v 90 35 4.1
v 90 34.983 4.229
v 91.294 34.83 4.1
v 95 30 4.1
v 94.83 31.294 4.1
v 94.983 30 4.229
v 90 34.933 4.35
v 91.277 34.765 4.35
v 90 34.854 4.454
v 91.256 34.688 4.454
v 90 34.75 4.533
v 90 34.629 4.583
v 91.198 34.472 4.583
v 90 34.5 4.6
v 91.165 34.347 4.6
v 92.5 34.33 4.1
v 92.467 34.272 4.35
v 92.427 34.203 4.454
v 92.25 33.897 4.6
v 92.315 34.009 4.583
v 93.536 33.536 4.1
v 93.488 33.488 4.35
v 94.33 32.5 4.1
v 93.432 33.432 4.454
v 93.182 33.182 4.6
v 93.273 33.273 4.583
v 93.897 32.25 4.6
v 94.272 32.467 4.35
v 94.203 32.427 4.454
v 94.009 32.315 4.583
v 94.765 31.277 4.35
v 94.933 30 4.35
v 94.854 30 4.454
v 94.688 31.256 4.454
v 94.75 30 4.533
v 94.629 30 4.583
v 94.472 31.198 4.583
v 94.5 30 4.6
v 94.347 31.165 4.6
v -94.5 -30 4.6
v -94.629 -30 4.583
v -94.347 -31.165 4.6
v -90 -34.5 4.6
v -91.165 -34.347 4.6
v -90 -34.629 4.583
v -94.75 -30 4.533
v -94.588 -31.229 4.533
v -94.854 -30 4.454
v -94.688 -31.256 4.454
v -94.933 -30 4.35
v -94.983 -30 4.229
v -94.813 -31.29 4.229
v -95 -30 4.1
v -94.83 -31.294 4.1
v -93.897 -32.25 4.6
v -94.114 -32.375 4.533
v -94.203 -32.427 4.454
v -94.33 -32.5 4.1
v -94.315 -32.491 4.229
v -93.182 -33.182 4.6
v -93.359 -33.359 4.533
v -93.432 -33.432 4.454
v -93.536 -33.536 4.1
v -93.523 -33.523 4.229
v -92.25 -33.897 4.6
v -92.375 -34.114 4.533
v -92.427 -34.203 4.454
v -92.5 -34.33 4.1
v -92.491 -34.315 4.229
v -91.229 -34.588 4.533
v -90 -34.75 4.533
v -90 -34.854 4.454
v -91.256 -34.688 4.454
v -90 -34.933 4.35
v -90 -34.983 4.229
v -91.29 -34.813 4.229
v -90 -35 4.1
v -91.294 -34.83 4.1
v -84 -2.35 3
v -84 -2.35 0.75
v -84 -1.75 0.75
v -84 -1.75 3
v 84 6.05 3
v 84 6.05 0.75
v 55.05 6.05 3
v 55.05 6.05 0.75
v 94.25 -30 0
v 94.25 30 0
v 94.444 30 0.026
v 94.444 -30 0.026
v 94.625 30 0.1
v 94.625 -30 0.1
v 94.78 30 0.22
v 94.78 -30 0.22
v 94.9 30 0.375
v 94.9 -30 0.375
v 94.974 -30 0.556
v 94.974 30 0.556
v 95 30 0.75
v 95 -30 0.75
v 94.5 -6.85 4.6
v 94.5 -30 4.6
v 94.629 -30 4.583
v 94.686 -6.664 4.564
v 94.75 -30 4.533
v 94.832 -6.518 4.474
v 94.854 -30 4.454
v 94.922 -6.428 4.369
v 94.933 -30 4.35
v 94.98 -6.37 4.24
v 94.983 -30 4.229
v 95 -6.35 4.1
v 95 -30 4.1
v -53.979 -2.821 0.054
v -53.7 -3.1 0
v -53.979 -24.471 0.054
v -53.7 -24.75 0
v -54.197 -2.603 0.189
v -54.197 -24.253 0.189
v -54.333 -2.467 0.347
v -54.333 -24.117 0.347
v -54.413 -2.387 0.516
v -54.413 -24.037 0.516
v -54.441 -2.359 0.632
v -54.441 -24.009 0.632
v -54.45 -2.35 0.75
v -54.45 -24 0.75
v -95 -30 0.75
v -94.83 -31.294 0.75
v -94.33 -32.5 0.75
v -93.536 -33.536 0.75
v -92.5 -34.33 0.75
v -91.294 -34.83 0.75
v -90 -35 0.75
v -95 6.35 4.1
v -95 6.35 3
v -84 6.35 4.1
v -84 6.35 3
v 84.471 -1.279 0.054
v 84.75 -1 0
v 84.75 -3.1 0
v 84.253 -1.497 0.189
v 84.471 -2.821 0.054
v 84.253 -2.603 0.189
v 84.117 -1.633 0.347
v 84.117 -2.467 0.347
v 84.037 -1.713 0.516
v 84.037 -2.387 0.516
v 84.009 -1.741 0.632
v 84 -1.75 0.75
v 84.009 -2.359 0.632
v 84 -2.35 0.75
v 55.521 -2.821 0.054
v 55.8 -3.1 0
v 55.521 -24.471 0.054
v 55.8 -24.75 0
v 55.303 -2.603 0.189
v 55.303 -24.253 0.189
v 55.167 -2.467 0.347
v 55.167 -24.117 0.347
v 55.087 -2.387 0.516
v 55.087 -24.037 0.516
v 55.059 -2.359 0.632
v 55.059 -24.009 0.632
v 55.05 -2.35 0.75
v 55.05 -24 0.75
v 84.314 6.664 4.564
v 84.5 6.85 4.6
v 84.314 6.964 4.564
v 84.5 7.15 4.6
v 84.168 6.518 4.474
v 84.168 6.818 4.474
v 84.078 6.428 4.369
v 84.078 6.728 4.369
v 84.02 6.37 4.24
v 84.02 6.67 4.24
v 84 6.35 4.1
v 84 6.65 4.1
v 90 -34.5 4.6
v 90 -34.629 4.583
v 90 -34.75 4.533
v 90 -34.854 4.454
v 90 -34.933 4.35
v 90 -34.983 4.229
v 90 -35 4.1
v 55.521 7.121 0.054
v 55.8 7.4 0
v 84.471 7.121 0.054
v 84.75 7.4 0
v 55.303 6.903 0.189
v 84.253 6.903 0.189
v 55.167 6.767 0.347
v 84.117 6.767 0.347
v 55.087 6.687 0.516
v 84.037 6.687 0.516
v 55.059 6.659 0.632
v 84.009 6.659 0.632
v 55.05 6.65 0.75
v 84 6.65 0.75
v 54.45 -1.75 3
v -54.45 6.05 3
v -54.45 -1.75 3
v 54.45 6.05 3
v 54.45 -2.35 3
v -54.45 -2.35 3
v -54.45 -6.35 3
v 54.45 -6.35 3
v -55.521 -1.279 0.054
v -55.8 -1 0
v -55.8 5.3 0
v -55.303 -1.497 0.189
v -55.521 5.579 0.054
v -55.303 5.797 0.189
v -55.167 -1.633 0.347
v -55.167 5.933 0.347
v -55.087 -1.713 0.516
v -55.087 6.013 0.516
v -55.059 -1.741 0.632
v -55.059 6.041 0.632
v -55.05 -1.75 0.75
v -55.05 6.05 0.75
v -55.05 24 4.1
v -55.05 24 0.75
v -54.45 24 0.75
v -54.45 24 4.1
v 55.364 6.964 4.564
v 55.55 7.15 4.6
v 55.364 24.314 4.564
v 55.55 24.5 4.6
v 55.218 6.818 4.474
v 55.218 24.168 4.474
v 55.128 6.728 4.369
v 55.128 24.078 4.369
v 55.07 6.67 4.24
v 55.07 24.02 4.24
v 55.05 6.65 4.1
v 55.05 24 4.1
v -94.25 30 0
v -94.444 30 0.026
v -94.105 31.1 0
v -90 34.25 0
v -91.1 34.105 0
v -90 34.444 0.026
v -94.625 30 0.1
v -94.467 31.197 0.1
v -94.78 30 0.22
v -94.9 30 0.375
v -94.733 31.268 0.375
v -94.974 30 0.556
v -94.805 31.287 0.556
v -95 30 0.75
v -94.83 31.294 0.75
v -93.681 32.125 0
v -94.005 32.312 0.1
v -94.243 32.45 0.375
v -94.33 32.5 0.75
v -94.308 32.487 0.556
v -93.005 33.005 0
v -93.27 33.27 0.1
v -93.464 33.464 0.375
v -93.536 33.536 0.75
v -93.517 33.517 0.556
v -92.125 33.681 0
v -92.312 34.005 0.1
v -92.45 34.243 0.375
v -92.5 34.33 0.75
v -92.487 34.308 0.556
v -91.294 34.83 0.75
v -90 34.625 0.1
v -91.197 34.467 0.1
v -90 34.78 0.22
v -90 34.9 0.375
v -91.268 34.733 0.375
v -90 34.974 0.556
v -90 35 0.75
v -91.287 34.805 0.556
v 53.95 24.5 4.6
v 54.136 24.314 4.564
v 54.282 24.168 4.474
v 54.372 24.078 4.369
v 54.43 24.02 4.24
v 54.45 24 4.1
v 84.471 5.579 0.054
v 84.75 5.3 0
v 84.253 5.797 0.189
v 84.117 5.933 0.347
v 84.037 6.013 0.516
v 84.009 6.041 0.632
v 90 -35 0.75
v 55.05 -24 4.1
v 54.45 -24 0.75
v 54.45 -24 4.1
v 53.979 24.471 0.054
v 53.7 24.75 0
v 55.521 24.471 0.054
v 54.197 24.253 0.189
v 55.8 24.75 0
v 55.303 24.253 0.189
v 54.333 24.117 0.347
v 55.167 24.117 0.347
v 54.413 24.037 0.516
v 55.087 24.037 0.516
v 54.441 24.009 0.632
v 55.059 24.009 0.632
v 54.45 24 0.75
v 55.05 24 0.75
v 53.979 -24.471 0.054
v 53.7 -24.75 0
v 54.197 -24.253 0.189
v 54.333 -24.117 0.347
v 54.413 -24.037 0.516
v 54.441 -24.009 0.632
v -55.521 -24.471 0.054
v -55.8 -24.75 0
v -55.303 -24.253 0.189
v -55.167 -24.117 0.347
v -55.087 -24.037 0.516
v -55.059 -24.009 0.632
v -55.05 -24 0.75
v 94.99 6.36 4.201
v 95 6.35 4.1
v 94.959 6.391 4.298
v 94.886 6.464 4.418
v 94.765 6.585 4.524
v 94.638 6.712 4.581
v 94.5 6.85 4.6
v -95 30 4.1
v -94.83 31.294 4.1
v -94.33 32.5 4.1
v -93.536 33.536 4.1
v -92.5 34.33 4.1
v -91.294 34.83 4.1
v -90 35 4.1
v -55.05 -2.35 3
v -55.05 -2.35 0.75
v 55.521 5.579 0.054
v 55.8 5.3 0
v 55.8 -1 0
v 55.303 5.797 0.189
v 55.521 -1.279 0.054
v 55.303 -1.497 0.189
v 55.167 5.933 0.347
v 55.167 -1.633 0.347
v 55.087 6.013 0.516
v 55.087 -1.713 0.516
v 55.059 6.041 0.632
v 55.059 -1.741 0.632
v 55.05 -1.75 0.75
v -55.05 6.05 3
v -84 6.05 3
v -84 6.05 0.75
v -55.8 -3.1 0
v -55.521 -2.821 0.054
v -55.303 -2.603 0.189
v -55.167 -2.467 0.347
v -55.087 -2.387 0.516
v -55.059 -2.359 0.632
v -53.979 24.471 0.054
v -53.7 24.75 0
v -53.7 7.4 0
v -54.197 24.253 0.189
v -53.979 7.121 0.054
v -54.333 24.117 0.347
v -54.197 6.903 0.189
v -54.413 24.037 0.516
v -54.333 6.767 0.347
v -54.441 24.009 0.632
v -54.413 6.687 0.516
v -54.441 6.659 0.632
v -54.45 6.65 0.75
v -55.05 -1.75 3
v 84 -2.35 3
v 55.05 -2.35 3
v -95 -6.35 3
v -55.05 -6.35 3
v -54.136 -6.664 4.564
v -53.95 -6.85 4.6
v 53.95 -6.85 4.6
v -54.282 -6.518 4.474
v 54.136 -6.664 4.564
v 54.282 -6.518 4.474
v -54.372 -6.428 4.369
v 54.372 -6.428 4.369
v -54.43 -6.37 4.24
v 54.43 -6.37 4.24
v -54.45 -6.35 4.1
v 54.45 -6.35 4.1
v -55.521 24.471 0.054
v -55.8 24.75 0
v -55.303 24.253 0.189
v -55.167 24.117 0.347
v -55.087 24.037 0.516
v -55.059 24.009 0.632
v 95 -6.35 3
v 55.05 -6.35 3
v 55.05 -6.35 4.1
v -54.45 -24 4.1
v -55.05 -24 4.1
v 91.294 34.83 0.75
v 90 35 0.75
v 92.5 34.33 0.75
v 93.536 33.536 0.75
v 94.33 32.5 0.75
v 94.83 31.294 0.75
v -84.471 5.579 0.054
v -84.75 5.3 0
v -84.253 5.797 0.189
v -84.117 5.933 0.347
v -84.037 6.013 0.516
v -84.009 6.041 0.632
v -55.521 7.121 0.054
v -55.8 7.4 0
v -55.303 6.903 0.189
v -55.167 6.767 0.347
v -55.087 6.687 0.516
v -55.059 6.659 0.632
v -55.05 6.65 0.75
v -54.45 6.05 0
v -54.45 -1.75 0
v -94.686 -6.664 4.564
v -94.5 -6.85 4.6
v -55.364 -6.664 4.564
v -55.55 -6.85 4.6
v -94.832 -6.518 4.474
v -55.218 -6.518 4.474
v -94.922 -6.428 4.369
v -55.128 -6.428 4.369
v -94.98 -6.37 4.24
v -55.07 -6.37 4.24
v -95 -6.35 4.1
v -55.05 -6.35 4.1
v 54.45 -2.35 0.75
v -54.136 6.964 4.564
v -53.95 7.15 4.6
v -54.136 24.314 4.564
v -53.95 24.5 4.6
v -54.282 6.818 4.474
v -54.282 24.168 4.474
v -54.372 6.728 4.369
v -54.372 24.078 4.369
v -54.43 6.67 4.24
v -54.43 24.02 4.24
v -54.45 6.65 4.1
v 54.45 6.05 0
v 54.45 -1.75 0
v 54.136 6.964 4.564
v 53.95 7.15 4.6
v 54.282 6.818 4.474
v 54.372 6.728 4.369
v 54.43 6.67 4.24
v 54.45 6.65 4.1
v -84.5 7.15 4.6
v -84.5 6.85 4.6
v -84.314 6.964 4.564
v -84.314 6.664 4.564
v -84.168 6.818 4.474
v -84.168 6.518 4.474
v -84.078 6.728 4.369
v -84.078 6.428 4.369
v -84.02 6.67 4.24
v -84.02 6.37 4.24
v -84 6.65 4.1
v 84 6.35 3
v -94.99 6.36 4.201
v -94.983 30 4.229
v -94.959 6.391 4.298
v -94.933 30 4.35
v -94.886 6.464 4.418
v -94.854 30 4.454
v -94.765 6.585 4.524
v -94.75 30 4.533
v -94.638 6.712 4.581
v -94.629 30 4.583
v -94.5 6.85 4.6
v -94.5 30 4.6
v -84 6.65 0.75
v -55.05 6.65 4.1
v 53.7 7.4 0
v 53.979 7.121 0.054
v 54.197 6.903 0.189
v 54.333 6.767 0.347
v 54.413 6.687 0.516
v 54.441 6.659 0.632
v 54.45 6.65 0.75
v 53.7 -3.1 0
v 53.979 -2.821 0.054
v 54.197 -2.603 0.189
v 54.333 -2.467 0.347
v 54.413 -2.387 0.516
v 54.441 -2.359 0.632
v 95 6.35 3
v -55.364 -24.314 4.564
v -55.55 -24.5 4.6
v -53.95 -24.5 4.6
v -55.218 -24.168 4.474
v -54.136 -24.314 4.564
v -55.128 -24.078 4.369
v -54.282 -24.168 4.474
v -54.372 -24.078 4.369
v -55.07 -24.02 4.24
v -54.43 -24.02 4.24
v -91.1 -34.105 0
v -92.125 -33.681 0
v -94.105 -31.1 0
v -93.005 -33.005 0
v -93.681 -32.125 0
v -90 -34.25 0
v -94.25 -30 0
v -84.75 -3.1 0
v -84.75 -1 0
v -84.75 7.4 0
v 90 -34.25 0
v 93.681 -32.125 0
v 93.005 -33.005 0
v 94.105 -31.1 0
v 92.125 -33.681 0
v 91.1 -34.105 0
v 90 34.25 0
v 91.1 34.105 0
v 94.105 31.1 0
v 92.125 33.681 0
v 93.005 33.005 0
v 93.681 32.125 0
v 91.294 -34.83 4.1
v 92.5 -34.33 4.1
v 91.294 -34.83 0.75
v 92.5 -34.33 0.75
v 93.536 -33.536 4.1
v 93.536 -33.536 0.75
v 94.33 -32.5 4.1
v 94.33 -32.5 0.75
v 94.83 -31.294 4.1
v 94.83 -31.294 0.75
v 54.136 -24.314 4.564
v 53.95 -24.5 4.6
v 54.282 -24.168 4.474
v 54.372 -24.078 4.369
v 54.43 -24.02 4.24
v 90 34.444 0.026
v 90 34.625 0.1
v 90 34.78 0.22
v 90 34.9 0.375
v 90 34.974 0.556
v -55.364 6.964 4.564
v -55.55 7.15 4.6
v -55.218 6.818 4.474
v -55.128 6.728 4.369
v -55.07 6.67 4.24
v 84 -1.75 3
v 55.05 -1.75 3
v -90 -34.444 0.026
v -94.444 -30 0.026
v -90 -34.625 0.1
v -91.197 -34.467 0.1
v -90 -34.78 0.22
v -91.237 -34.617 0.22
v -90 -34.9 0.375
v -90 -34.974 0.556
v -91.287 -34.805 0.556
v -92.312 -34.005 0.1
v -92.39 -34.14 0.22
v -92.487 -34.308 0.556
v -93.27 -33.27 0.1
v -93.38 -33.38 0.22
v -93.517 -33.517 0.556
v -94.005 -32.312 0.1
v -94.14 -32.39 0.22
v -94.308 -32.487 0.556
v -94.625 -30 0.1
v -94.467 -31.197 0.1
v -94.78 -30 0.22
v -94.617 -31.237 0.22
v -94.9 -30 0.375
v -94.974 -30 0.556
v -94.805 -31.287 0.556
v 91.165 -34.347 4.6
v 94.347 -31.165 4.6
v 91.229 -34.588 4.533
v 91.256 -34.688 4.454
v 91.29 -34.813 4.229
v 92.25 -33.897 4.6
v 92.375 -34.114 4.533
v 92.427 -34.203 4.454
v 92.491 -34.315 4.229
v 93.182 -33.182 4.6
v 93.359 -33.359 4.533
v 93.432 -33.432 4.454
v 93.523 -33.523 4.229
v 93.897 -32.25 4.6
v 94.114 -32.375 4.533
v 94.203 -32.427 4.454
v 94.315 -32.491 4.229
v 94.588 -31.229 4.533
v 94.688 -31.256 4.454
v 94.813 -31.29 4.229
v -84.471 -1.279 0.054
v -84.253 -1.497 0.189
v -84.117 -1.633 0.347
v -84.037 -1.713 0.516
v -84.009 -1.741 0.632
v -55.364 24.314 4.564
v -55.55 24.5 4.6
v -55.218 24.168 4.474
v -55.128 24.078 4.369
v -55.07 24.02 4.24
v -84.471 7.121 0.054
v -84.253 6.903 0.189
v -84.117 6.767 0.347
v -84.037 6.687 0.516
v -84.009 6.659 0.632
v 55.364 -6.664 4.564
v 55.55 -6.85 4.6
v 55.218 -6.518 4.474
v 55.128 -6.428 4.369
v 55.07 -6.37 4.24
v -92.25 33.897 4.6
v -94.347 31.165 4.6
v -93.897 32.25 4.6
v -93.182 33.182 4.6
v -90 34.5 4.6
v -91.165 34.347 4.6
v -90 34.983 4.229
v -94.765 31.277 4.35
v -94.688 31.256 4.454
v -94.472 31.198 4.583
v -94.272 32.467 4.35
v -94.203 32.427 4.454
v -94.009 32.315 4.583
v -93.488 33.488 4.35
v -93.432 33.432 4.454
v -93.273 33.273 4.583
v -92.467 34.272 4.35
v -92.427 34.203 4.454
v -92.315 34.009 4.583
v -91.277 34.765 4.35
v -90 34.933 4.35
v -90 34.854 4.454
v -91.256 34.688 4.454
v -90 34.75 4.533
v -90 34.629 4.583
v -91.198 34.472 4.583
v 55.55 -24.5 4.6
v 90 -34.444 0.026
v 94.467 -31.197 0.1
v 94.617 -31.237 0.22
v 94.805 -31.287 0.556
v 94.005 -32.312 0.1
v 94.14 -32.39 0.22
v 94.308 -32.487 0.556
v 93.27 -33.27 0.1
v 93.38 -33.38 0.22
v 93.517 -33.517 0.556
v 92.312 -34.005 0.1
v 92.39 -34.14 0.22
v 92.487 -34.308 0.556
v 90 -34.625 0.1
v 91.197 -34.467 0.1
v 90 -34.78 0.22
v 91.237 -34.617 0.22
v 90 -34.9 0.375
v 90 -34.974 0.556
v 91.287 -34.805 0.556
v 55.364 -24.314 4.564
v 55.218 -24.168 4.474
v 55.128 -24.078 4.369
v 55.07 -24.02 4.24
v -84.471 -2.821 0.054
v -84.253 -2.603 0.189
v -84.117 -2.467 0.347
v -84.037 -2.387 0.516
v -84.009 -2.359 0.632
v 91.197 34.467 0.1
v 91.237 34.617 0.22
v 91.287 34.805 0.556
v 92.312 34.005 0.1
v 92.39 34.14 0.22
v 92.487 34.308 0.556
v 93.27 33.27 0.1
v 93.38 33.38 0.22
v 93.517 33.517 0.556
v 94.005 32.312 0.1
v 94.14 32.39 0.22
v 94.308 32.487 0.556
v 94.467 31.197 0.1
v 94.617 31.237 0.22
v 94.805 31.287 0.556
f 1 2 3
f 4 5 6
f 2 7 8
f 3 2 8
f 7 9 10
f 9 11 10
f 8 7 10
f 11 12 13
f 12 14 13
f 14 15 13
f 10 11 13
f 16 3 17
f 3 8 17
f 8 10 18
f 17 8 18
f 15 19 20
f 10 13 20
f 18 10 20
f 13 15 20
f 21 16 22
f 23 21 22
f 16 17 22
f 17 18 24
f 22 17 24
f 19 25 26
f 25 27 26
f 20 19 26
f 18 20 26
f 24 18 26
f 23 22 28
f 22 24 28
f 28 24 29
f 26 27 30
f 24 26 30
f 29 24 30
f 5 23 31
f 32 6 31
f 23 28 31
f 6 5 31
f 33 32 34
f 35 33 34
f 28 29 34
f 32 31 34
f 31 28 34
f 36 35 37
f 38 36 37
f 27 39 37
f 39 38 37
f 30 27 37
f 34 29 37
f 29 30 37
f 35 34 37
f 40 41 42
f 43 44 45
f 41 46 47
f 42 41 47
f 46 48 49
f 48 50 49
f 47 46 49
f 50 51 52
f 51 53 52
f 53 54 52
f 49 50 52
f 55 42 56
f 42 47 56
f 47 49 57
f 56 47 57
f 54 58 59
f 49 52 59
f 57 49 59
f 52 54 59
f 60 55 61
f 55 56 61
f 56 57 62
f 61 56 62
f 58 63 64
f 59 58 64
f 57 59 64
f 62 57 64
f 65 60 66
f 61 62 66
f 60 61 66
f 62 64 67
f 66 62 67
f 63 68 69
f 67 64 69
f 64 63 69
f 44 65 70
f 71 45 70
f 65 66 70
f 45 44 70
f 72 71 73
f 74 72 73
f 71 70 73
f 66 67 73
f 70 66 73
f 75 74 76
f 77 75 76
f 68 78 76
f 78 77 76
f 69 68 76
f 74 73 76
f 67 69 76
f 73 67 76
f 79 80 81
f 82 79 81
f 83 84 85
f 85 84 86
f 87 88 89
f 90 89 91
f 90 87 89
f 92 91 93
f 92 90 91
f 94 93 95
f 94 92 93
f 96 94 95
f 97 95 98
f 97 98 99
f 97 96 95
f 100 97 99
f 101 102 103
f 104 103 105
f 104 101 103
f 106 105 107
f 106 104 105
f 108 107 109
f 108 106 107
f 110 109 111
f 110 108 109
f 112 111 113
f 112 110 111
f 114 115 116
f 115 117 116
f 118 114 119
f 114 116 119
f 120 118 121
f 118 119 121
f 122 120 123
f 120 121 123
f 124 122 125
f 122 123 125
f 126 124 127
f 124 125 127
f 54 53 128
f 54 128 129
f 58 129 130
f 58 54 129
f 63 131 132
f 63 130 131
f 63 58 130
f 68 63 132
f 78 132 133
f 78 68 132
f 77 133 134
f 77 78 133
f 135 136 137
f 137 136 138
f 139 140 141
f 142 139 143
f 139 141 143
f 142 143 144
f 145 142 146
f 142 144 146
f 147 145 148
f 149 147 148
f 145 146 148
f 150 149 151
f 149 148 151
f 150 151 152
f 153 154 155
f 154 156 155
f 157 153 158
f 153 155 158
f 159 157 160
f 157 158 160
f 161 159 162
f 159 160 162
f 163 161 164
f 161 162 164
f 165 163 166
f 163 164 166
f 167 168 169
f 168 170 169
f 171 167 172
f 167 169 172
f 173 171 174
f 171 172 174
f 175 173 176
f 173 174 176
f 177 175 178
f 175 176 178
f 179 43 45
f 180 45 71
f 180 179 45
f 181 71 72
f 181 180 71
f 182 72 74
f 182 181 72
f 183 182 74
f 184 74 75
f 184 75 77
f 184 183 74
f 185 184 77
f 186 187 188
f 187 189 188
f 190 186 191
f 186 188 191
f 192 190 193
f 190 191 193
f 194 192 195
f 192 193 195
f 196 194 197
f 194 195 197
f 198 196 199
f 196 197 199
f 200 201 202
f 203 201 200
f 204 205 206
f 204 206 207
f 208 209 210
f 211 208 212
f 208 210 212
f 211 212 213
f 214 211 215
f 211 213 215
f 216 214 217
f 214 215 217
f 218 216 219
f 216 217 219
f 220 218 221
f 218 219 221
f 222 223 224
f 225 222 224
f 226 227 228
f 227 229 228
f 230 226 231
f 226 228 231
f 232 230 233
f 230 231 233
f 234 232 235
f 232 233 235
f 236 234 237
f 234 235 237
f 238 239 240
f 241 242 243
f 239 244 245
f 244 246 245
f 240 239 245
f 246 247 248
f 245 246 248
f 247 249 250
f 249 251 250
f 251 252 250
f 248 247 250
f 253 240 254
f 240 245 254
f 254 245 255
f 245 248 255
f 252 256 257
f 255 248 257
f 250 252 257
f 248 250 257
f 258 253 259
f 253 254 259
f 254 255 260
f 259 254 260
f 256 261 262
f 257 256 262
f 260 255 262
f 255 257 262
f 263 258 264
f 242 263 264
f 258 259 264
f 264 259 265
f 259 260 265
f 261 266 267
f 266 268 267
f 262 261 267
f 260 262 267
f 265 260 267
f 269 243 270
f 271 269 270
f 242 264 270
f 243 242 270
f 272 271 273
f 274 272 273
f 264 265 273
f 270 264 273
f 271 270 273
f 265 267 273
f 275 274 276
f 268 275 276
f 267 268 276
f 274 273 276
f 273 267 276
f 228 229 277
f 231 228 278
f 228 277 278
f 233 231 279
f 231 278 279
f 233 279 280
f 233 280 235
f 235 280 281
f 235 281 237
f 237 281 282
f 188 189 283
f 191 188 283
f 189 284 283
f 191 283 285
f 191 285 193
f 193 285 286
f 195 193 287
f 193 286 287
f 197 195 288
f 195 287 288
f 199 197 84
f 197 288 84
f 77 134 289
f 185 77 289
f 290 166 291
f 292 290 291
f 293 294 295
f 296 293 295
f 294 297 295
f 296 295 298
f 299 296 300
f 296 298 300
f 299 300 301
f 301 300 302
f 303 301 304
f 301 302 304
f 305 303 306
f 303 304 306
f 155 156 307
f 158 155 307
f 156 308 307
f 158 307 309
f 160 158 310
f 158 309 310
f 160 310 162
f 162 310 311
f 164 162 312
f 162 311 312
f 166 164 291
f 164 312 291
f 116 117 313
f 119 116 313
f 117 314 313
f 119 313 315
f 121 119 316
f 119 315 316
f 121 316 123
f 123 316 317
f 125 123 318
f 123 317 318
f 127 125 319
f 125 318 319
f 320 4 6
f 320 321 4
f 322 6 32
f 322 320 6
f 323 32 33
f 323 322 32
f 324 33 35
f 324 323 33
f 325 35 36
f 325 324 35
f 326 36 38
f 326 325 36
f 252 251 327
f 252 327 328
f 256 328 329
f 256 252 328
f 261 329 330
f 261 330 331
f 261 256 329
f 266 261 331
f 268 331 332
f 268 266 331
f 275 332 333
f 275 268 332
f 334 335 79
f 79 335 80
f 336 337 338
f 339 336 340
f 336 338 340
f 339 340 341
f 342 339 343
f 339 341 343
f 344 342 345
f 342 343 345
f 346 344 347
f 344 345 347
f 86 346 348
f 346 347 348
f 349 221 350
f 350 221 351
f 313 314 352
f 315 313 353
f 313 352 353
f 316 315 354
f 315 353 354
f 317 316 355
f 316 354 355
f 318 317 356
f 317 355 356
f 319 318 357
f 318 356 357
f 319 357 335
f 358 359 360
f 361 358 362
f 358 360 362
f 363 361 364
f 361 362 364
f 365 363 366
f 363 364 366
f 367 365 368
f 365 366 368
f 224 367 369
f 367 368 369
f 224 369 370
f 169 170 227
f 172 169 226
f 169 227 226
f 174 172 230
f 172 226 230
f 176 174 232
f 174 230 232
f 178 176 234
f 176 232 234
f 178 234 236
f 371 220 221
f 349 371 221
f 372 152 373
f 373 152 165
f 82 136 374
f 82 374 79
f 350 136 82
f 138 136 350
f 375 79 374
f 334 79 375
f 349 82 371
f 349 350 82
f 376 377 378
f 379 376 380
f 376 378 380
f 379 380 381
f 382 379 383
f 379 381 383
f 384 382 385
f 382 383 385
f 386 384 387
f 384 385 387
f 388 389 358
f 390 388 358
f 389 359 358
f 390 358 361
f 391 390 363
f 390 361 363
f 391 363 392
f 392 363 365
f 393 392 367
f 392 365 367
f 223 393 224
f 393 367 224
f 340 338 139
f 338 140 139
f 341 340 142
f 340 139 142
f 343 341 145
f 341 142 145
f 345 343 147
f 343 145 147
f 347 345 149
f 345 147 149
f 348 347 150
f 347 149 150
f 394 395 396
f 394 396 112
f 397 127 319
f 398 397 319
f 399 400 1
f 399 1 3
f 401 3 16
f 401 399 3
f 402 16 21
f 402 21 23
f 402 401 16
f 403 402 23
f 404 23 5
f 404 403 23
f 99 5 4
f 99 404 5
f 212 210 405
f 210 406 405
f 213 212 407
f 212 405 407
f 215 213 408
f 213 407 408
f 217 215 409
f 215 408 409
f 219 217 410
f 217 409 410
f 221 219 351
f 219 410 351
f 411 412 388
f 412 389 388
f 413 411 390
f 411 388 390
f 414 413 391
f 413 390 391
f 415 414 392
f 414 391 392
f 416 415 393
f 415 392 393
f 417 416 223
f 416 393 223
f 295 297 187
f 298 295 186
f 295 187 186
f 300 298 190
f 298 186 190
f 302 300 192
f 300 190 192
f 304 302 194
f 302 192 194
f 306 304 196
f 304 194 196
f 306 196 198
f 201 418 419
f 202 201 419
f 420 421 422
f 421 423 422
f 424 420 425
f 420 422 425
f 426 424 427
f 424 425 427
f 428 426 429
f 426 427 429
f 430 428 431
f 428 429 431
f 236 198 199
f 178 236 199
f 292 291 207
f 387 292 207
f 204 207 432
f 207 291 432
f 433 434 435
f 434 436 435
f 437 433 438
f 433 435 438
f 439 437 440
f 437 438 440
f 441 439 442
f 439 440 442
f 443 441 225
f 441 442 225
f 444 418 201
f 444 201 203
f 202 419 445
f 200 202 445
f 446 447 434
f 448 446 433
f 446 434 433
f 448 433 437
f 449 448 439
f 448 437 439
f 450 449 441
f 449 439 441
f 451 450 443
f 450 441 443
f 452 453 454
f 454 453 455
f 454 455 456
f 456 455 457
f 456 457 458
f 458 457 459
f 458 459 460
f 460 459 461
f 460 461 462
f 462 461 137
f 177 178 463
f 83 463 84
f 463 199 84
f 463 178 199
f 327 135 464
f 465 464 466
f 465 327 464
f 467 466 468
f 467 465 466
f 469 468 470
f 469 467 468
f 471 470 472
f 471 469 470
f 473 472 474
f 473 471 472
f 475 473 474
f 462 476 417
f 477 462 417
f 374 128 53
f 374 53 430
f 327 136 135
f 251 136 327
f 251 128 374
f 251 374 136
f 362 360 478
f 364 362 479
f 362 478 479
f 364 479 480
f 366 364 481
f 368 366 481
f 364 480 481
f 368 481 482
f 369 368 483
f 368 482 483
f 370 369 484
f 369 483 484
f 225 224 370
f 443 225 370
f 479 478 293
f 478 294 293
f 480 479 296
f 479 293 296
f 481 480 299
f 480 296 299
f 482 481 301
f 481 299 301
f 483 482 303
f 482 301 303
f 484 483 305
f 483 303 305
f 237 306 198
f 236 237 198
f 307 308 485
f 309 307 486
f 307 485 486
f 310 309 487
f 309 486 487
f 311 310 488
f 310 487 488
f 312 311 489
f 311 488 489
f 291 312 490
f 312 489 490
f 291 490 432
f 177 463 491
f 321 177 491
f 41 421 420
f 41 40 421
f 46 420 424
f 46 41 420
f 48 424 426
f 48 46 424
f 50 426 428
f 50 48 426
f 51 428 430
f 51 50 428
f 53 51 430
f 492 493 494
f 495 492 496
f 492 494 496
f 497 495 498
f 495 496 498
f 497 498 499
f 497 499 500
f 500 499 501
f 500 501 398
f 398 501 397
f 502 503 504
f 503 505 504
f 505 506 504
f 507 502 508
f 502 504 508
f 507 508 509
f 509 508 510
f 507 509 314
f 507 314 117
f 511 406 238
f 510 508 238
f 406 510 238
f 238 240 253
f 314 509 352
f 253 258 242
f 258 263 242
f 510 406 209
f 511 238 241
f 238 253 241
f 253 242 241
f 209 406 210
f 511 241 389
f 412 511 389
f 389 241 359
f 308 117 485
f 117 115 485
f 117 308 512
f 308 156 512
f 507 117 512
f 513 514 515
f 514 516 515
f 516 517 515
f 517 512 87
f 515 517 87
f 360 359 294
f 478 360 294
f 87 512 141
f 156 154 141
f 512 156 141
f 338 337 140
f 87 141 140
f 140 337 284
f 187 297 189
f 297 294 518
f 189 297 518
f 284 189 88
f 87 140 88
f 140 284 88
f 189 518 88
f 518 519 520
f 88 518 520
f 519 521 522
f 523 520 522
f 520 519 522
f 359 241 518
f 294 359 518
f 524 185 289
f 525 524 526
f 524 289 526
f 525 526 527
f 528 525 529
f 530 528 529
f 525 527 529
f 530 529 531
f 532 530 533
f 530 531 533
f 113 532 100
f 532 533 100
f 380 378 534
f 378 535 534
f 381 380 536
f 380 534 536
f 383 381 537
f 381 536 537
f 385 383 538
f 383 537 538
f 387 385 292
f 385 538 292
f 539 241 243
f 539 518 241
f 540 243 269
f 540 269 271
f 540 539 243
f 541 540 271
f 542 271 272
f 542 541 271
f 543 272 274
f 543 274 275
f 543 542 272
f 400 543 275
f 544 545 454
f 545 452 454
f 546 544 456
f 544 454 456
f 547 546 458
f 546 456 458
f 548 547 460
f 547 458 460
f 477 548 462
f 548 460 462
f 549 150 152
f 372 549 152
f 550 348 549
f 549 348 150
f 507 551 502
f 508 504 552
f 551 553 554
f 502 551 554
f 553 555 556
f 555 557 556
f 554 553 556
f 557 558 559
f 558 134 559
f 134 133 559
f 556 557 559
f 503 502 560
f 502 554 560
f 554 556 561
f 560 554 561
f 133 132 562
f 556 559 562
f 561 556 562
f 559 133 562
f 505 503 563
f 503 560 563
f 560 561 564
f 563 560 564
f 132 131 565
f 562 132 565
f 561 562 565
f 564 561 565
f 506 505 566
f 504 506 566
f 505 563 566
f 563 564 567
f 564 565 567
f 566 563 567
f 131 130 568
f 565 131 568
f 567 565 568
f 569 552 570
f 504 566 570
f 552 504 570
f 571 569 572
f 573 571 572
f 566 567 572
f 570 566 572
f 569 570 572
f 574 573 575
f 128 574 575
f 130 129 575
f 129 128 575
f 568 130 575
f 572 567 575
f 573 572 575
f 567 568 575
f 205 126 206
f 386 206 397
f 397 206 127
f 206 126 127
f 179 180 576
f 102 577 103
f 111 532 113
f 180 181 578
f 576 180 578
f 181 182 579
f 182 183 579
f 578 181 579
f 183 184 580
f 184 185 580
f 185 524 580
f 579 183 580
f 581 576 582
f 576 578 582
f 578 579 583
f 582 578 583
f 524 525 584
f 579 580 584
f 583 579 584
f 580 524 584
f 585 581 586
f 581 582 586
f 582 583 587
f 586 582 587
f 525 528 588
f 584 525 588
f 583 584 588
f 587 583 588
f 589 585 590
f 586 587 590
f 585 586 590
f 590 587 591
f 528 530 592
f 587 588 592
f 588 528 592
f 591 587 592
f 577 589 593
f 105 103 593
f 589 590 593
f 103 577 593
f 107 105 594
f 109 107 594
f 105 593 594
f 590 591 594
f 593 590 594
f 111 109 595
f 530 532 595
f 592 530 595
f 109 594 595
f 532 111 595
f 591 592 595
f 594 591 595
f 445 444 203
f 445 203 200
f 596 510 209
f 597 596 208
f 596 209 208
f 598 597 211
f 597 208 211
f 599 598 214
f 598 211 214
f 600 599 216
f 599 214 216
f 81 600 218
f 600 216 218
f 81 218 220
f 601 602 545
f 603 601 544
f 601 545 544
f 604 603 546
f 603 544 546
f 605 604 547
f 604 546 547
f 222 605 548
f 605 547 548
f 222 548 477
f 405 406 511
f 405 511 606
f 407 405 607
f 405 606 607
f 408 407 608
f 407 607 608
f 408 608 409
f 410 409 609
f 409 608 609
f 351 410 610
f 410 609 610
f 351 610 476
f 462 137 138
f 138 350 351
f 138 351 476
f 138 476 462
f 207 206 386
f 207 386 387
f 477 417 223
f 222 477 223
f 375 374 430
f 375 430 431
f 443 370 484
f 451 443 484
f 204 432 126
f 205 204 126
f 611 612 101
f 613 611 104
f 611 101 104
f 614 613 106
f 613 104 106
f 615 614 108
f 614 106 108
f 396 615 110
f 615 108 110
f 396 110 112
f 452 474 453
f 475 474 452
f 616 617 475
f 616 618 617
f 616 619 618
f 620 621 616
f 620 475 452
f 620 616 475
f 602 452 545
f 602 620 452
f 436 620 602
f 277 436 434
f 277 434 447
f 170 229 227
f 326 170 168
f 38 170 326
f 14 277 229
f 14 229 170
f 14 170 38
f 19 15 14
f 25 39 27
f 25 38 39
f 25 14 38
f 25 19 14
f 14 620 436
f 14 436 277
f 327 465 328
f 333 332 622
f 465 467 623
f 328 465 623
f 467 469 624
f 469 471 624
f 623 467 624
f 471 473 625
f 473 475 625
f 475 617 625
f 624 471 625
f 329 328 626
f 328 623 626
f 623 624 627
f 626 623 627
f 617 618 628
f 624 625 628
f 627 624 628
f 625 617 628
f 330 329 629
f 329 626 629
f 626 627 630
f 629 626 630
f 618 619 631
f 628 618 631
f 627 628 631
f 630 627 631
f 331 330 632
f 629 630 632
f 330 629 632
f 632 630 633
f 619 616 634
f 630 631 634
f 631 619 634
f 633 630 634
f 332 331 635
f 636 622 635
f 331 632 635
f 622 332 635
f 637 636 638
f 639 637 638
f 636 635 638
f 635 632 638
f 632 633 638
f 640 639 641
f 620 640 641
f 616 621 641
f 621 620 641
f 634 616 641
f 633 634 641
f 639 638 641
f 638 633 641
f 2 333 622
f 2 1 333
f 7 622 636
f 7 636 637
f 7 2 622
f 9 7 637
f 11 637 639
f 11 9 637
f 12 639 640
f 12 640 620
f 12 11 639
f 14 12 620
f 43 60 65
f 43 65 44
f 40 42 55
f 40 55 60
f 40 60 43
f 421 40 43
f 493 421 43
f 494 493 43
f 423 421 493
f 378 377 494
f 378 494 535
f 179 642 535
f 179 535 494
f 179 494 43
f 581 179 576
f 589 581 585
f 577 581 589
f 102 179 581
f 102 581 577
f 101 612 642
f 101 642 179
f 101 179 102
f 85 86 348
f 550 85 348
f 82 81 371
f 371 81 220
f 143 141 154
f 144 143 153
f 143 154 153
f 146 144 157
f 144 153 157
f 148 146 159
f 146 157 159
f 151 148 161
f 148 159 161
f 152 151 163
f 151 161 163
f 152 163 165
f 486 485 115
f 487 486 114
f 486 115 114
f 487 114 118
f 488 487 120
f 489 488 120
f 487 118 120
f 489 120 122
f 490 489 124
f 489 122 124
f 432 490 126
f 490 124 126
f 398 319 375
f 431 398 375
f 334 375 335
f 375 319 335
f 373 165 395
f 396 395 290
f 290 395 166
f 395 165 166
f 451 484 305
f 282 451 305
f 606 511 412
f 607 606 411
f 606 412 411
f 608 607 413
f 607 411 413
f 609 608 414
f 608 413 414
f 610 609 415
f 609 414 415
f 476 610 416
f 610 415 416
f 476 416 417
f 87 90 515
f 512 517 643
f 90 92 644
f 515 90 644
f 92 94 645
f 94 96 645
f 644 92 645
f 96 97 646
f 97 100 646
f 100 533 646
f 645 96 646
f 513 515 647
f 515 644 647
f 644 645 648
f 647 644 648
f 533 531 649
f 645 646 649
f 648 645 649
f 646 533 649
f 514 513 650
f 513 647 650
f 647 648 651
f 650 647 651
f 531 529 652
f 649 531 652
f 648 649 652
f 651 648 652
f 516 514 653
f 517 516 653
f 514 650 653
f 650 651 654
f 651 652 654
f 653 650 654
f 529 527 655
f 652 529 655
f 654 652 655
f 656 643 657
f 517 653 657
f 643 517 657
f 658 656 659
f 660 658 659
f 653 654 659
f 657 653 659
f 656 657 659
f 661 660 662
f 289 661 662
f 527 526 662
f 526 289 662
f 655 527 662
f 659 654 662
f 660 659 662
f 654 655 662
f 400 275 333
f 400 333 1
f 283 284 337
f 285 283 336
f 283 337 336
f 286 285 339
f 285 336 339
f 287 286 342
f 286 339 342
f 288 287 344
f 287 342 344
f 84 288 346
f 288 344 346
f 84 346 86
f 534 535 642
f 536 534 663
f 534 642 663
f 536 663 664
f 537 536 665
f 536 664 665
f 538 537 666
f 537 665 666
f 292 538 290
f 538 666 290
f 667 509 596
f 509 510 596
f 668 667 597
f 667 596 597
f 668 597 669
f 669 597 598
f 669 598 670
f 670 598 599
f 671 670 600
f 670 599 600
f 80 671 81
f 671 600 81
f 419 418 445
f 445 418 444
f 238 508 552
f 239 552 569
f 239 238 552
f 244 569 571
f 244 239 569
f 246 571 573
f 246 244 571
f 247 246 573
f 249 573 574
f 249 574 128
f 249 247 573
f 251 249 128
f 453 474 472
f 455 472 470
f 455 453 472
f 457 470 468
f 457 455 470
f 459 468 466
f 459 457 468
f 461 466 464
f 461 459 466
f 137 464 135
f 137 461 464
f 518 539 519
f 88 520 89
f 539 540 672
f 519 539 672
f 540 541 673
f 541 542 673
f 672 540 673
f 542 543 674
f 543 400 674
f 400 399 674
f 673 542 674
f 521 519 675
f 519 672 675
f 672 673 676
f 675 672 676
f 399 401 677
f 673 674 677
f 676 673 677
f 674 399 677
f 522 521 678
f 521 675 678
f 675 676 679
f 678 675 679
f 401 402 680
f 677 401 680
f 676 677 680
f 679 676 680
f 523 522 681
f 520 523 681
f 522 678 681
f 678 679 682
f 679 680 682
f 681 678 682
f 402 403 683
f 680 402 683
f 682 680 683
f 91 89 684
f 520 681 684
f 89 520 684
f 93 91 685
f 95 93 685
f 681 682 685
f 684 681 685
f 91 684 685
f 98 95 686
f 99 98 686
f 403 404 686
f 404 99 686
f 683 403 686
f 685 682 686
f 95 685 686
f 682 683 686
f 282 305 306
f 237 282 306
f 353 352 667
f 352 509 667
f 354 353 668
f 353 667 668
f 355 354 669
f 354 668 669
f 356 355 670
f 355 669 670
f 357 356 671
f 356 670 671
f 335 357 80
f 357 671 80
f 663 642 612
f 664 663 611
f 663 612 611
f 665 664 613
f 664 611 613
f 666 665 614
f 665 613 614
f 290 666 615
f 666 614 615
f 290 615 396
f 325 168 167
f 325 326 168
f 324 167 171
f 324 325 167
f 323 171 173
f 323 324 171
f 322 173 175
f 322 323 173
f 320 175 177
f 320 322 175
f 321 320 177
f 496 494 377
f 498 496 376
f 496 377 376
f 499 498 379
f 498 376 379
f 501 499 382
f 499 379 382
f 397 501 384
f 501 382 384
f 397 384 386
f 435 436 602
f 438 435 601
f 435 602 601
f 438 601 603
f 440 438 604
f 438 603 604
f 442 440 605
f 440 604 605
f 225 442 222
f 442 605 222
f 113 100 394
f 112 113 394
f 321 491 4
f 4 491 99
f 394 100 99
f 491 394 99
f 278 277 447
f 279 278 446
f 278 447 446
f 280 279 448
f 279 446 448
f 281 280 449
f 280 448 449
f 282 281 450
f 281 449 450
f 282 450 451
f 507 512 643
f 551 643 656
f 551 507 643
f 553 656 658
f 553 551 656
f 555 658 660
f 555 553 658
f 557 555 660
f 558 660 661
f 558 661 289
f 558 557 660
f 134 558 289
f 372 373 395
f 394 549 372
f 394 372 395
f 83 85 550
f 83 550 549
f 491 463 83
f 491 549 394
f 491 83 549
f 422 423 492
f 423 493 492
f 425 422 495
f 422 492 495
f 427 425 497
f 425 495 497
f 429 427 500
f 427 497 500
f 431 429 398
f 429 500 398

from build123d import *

# Parameters (mm, degrees)
F0_W     = 190
F0_H     = 70
F1_DEPTH = 3
F2_W     = 190
F2_H     = 28.65
F3_DEPTH = 1.6
F4_W     = 108.9
F4_H     = 7.8
F5_DEPTH = 25
F6_R     = 5
F7_R     = 0.75
F8_R     = 0.5


with BuildPart() as f1:
    # F0 (on Top) → F1 (new body)
    with BuildSketch(Plane.XY):
        Rectangle(F0_W, F0_H)
    extrude(amount=F1_DEPTH)

    # F2 (on face) → F3 (join)
    with BuildSketch(Plane.XY.offset(3)):
        with Locations((0, 20.675)):
            Rectangle(F2_W, F2_H)
        with Locations((0, -20.675)):
            Rectangle(F2_W, F2_H)
    extrude(amount=F3_DEPTH)

    # F4 (on face) → F5 (cut)
    with BuildSketch(Plane(origin=(0, 0, 0), x_dir=(1, 0, 0), z_dir=(0, 0, -1))):
        Polygon((-55.05, 2.35), (-84, 2.35), (-84, 1.75), (-55.05, 1.75), (-55.05, -6.05), (-84, -6.05), (-84, -6.65), (-55.05, -6.65), (-55.05, -24), (-54.45, -24), (-54.45, -6.65), (54.45, -6.65), (54.45, -24), (55.05, -24), (55.05, -6.65), (84, -6.65), (84, -6.05), (55.05, -6.05), (55.05, 1.75), (84, 1.75), (84, 2.35), (55.05, 2.35), (55.05, 24), (54.45, 24), (54.45, 2.35), (-54.45, 2.35), (-54.45, 24), (-55.05, 24), align=None)
        with Locations((0, -2.15)):
            Rectangle(F4_W, F4_H, mode=Mode.SUBTRACT)
    extrude(amount=-F5_DEPTH, mode=Mode.SUBTRACT)

    # F6
    f6_edges = [f1.edges().sort_by_distance(p)[0] for p in [
        (95, 35, 2.3),
        (95, -35, 2.3),
        (-95, -35, 2.3),
        (-95, 35, 2.3),
    ]]
    fillet(f6_edges, radius=F6_R)

    # F7
    f7_edges = [f1.edges().sort_by_distance(p)[0] for p in [
        (0, 35, 0),
        (93.535534, 33.535534, 0),
        (-93.535534, 33.535534, 0),
        (95, 0, 0),
        (-95, 0, 0),
        (93.535534, -33.535534, 0),
        (-93.535534, -33.535534, 0),
        (0, -35, 0),
        (-55.05, -13.175, 0),
        (-54.75, -24, 0),
        (-54.45, -13.175, 0),
        (0, -2.35, 0),
        (54.45, -13.175, 0),
        (54.75, -24, 0),
        (55.05, -13.175, 0),
        (69.525, -2.35, 0),
        (84, -2.05, 0),
        (69.525, -1.75, 0),
        (55.05, 2.15, 0),
        (69.525, 6.05, 0),
        (84, 6.35, 0),
        (69.525, 6.65, 0),
        (55.05, 15.325, 0),
        (54.75, 24, 0),
        (54.45, 15.325, 0),
        (0, 6.65, 0),
        (-54.45, 15.325, 0),
        (-54.75, 24, 0),
        (-55.05, 15.325, 0),
        (-69.525, 6.65, 0),
        (-84, 6.35, 0),
        (-69.525, 6.05, 0),
        (-55.05, 2.15, 0),
        (-69.525, -1.75, 0),
        (-84, -2.05, 0),
        (-69.525, -2.35, 0),
    ]]
    fillet(f7_edges, radius=F7_R)

    # F8
    f8_edges = [f1.edges().sort_by_distance(p)[0] for p in [
        (95, -18.175, 4.6),
        (93.535534, -33.535534, 4.6),
        (75.025, -6.35, 4.6),
        (0, -35, 4.6),
        (55.05, -15.175, 4.6),
        (-93.535534, -33.535534, 4.6),
        (54.75, -24, 4.6),
        (-95, -18.175, 4.6),
        (54.45, -15.175, 4.6),
        (-75.025, -6.35, 4.6),
        (0, -6.35, 4.6),
        (-55.05, -15.175, 4.6),
        (-54.45, -15.175, 4.6),
        (-54.75, -24, 4.6),
        (-95, 18.175, 4.6),
        (-93.535534, 33.535534, 4.6),
        (-89.5, 6.35, 4.6),
        (0, 35, 4.6),
        (-84, 6.5, 4.6),
        (93.535534, 33.535534, 4.6),
        (-69.525, 6.65, 4.6),
        (95, 18.175, 4.6),
        (-55.05, 15.325, 4.6),
        (89.5, 6.35, 4.6),
        (-54.75, 24, 4.6),
        (84, 6.5, 4.6),
        (-54.45, 15.325, 4.6),
        (69.525, 6.65, 4.6),
        (0, 6.65, 4.6),
        (55.05, 15.325, 4.6),
        (54.45, 15.325, 4.6),
        (54.75, 24, 4.6),
    ]]
    fillet(f8_edges, radius=F8_R)


solid = f1.part
